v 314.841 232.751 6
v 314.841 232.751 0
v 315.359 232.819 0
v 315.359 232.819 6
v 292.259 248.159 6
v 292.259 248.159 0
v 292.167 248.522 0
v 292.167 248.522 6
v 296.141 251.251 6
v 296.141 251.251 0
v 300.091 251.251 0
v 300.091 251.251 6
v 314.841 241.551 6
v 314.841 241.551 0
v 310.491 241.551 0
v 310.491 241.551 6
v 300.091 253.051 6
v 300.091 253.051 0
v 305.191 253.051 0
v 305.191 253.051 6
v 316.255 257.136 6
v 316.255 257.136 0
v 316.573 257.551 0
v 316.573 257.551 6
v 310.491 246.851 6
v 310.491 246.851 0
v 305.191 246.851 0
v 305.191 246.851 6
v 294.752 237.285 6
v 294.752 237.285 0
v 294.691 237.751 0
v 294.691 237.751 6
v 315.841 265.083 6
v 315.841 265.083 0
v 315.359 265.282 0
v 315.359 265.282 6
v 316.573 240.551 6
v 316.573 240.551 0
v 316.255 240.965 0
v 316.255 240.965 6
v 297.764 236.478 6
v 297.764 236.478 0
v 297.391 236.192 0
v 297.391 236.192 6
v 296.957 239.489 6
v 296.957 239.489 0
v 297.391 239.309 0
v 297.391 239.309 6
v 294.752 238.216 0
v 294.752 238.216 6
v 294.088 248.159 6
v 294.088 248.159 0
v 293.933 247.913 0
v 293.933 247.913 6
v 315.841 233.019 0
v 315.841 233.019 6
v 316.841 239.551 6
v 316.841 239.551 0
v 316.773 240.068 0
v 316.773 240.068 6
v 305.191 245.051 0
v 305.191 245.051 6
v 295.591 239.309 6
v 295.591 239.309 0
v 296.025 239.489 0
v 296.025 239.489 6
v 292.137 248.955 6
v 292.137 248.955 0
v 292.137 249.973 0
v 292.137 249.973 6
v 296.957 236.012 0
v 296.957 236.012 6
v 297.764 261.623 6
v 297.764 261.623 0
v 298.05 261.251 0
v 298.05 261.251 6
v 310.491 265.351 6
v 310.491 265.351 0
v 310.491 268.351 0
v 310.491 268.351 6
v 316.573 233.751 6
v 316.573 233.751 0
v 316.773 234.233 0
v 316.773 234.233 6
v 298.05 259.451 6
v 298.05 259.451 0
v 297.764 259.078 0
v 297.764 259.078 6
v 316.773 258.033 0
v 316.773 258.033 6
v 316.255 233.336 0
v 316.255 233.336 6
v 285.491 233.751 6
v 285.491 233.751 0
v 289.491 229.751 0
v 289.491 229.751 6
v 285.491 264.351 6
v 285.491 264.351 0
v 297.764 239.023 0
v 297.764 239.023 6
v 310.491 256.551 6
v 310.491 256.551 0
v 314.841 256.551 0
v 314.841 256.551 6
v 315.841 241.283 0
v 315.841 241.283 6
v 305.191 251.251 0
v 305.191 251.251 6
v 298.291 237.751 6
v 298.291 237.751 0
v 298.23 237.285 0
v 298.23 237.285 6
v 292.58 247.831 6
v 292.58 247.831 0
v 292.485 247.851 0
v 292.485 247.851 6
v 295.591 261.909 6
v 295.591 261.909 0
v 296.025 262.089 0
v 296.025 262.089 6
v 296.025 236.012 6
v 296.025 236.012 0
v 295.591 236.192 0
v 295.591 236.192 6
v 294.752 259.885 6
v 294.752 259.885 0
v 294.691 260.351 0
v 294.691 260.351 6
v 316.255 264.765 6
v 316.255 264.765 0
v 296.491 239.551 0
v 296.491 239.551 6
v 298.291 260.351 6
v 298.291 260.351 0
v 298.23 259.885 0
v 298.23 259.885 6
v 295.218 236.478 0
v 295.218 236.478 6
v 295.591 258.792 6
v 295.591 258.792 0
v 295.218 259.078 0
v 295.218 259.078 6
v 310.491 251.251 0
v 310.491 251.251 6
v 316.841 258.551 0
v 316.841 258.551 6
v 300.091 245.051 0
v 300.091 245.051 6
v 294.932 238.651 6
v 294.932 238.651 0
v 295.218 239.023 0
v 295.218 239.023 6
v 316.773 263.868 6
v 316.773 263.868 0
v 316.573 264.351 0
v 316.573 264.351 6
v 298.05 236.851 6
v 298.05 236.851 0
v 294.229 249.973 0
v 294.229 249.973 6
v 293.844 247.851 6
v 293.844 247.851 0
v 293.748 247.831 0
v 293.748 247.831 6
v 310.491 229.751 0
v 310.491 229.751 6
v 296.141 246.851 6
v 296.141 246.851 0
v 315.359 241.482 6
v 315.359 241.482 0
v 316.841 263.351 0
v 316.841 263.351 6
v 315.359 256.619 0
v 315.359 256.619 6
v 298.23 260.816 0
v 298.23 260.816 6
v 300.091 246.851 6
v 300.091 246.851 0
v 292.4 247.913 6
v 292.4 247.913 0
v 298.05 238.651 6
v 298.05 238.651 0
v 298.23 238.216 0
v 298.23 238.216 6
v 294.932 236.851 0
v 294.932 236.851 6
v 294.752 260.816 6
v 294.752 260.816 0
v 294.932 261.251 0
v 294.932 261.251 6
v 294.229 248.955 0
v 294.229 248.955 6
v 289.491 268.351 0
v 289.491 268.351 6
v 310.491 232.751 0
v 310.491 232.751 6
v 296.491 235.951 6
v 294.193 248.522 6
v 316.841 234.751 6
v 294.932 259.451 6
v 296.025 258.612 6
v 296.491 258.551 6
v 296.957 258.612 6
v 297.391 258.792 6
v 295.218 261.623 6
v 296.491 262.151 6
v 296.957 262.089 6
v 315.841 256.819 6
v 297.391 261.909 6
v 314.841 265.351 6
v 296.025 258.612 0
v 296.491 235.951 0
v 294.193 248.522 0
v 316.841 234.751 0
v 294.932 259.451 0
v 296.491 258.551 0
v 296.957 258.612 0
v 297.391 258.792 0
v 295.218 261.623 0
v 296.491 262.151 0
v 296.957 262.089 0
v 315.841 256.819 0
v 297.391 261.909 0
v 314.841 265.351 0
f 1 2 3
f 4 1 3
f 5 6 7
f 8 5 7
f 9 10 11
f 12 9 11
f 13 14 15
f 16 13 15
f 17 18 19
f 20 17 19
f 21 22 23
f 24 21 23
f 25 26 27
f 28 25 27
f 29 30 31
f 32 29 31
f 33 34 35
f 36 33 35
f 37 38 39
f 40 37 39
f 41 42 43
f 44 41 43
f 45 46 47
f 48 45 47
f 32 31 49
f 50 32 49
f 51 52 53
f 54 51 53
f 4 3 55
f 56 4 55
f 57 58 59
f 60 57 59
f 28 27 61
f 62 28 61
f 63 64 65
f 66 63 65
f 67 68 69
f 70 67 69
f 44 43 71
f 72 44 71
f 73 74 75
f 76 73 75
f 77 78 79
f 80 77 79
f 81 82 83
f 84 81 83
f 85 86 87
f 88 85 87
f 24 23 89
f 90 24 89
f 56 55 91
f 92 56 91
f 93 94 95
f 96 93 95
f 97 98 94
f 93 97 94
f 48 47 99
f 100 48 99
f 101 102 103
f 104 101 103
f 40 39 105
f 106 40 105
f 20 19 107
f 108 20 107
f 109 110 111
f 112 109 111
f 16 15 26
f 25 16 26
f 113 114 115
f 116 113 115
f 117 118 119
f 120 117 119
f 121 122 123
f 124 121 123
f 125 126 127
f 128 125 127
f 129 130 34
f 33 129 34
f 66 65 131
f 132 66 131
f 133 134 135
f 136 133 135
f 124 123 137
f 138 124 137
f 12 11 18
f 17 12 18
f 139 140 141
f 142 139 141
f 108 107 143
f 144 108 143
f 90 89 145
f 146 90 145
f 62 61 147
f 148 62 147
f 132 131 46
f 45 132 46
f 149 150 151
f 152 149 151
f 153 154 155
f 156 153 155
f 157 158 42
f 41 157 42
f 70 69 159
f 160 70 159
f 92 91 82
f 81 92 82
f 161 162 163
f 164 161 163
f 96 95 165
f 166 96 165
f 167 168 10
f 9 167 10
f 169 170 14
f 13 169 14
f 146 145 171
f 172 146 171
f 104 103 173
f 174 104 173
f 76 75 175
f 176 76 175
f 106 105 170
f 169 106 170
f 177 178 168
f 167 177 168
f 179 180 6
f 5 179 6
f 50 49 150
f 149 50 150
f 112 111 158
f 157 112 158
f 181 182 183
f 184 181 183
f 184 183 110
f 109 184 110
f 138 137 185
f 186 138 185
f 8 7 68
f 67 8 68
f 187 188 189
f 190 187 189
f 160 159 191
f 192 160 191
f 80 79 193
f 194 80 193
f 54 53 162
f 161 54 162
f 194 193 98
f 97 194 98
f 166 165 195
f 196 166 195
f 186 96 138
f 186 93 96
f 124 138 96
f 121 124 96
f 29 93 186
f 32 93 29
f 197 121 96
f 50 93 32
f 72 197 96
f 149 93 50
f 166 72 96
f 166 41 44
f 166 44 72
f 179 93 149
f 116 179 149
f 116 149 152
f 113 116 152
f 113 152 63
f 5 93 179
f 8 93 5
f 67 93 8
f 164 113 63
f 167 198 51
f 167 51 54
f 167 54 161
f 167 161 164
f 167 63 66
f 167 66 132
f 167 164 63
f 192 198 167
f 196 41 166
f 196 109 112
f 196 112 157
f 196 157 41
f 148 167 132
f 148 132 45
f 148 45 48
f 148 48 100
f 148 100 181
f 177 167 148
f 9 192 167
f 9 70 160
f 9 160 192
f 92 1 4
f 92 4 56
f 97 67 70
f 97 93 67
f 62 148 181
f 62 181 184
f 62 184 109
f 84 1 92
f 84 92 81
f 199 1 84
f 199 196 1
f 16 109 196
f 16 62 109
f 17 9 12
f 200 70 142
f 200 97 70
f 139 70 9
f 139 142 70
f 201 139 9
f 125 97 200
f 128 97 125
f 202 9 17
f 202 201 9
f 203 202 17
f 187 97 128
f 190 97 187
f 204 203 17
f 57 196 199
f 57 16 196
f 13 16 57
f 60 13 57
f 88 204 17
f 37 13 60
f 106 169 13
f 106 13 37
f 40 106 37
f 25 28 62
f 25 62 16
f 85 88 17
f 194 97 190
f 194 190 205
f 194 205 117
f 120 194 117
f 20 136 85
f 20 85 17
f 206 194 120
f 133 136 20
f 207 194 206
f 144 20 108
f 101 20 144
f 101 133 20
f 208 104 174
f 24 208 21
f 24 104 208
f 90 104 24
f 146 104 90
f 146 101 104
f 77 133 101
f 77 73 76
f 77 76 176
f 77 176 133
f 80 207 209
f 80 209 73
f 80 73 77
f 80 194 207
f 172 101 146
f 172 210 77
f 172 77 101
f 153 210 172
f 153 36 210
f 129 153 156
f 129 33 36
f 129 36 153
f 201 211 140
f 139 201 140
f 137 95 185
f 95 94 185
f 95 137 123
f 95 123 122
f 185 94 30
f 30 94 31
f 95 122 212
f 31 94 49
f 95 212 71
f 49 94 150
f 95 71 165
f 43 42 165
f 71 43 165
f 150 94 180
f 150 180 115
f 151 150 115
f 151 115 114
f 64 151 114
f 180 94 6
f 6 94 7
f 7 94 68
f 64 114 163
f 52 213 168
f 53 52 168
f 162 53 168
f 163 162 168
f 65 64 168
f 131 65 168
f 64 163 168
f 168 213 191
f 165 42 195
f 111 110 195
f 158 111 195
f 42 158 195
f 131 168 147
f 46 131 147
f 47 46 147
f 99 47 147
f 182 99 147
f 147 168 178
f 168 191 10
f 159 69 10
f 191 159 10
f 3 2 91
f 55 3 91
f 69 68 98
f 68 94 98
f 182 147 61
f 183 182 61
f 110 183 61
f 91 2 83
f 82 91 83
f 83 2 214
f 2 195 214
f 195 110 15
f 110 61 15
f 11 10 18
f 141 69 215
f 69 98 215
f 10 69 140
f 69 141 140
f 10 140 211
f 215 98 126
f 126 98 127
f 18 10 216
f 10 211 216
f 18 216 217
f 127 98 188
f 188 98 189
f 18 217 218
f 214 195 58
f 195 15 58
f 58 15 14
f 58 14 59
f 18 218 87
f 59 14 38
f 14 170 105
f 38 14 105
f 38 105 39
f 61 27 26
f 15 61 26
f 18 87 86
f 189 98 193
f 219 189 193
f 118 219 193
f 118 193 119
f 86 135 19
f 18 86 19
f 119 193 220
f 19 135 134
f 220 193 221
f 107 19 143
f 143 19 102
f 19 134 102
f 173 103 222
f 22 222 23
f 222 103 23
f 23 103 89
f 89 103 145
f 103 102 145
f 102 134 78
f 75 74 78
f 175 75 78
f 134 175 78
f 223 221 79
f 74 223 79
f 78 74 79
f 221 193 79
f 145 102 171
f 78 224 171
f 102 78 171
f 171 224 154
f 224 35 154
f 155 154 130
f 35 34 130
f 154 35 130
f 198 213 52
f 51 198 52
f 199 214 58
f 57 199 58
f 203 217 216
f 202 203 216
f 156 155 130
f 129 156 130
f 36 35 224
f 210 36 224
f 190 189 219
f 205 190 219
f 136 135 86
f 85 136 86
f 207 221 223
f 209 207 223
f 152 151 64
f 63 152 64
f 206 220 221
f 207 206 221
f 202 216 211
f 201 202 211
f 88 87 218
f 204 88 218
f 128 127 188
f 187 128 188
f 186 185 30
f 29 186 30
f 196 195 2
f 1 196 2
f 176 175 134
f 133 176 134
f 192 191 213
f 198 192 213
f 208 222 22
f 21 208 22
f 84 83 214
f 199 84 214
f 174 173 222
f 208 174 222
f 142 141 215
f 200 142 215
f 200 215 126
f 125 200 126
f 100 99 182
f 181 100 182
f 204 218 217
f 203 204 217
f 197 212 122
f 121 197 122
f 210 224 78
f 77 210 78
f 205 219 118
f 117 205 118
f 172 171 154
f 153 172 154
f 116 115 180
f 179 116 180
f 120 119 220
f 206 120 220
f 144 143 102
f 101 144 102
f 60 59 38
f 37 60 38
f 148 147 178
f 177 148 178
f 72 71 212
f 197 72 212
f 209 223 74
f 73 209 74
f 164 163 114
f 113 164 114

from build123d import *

# Parameters (mm, degrees)
BOSS_EXTRUDE1_DEPTH = 6


with BuildPart() as part:
    # Sketch1 → Boss-Extrude1 (new body)
    with BuildSketch(Plane.XY):
        Polygon((316.255247905, 240.964803396), (315.841034343, 241.282640641), (315.358672433, 241.482441486), (314.841034343, 241.550589833), (310.491036452, 241.550589833), (310.491036452, 246.850587088), (305.19103763, 246.850587088), (305.19103763, 245.050588856), (300.091039865, 245.050588856), (300.091039865, 246.850587088), (296.141040043, 246.850587088), (296.141040043, 251.25059176), (300.091039865, 251.25059176), (300.091039865, 253.050589992), (305.19103763, 253.050589992), (305.19103763, 251.25059176), (310.491036452, 251.25059176), (310.491036452, 256.550583767), (314.841034343, 256.550583767), (315.358672433, 256.618732114), (315.841034343, 256.818532959), (316.255247905, 257.136370204), (316.57308515, 257.550583767), (316.772885995, 258.032945676), (316.841034343, 258.550583767), (316.841034343, 263.350579732), (316.772885995, 263.868217822), (316.57308515, 264.350579732), (316.255247905, 264.764793294), (315.841034343, 265.082630539), (315.358672433, 265.282431384), (314.841034343, 265.350579732), (310.491036452, 265.350579732), (310.491036452, 268.350579732), (289.491036452, 268.350579732), (285.491036452, 264.350579732), (285.491036452, 233.750595391), (289.491036452, 229.750595391), (310.491036452, 229.750595391), (310.491036452, 232.750595391), (314.841034343, 232.750595391), (315.358672433, 232.818743738), (315.841034343, 233.018544583), (316.255247905, 233.336381829), (316.57308515, 233.750595391), (316.772885995, 234.232957301), (316.841034343, 234.750595391), (316.841034343, 239.550589833), (316.772885995, 240.068227923), (316.57308515, 240.550589833), align=None)
        Polygon((296.491036452, 235.950595391), (296.02516217, 236.011928904), (295.591036452, 236.191749664), (295.218244245, 236.477803185), (294.932190725, 236.850595391), (294.752369964, 237.28472111), (294.691036452, 237.750595391), (294.752369964, 238.216469672), (294.932190725, 238.650595391), (295.218244245, 239.023387597), (295.591036452, 239.309441118), (296.02516217, 239.489261878), (296.491036452, 239.550595391), (296.956910733, 239.489261878), (297.391036452, 239.309441118), (297.763828658, 239.023387597), (298.049882178, 238.650595391), (298.229702939, 238.216469672), (298.291036452, 237.750595391), (298.229702939, 237.28472111), (298.049882178, 236.850595391), (297.763828658, 236.477803185), (297.391036452, 236.191749664), (296.956910733, 236.011928904), align=None, mode=Mode.SUBTRACT)
        Polygon((292.167294345, 248.521745899), (292.136860132, 248.95490496), (292.136860132, 249.972673633), (292.137050681, 249.972673633), (294.228561733, 249.972673633), (294.228561733, 248.95490496), (294.193435256, 248.521745899), (294.088055826, 248.158815973), (293.932728797, 247.912954455), (293.84394944, 247.851489075), (293.747759523, 247.831000615), (292.580314782, 247.831000615), (292.58017187, 247.831000615), (292.485290658, 247.851455341), (292.485134177, 247.851489075), (292.399859132, 247.912954455), (292.258596985, 248.158815973), align=None, mode=Mode.SUBTRACT)
        Polygon((295.218244245, 259.077787526), (294.932190725, 259.450579732), (294.752369964, 259.884705451), (294.691036452, 260.350579732), (294.752369964, 260.816454013), (294.932190725, 261.250579732), (295.218244245, 261.623371938), (295.591036452, 261.909425459), (296.02516217, 262.089246219), (296.491036452, 262.150579732), (296.956910733, 262.089246219), (297.391036452, 261.909425459), (297.763828658, 261.623371938), (298.049882178, 261.250579732), (298.229702939, 260.816454013), (298.291036452, 260.350579732), (298.229702939, 259.884705451), (298.049882178, 259.450579732), (297.763828658, 259.077787526), (297.391036452, 258.791734005), (296.956910733, 258.611913244), (296.491036452, 258.550579732), (296.02516217, 258.611913244), (295.591036452, 258.791734005), align=None, mode=Mode.SUBTRACT)
    extrude(amount=BOSS_EXTRUDE1_DEPTH)


solid = part.part
